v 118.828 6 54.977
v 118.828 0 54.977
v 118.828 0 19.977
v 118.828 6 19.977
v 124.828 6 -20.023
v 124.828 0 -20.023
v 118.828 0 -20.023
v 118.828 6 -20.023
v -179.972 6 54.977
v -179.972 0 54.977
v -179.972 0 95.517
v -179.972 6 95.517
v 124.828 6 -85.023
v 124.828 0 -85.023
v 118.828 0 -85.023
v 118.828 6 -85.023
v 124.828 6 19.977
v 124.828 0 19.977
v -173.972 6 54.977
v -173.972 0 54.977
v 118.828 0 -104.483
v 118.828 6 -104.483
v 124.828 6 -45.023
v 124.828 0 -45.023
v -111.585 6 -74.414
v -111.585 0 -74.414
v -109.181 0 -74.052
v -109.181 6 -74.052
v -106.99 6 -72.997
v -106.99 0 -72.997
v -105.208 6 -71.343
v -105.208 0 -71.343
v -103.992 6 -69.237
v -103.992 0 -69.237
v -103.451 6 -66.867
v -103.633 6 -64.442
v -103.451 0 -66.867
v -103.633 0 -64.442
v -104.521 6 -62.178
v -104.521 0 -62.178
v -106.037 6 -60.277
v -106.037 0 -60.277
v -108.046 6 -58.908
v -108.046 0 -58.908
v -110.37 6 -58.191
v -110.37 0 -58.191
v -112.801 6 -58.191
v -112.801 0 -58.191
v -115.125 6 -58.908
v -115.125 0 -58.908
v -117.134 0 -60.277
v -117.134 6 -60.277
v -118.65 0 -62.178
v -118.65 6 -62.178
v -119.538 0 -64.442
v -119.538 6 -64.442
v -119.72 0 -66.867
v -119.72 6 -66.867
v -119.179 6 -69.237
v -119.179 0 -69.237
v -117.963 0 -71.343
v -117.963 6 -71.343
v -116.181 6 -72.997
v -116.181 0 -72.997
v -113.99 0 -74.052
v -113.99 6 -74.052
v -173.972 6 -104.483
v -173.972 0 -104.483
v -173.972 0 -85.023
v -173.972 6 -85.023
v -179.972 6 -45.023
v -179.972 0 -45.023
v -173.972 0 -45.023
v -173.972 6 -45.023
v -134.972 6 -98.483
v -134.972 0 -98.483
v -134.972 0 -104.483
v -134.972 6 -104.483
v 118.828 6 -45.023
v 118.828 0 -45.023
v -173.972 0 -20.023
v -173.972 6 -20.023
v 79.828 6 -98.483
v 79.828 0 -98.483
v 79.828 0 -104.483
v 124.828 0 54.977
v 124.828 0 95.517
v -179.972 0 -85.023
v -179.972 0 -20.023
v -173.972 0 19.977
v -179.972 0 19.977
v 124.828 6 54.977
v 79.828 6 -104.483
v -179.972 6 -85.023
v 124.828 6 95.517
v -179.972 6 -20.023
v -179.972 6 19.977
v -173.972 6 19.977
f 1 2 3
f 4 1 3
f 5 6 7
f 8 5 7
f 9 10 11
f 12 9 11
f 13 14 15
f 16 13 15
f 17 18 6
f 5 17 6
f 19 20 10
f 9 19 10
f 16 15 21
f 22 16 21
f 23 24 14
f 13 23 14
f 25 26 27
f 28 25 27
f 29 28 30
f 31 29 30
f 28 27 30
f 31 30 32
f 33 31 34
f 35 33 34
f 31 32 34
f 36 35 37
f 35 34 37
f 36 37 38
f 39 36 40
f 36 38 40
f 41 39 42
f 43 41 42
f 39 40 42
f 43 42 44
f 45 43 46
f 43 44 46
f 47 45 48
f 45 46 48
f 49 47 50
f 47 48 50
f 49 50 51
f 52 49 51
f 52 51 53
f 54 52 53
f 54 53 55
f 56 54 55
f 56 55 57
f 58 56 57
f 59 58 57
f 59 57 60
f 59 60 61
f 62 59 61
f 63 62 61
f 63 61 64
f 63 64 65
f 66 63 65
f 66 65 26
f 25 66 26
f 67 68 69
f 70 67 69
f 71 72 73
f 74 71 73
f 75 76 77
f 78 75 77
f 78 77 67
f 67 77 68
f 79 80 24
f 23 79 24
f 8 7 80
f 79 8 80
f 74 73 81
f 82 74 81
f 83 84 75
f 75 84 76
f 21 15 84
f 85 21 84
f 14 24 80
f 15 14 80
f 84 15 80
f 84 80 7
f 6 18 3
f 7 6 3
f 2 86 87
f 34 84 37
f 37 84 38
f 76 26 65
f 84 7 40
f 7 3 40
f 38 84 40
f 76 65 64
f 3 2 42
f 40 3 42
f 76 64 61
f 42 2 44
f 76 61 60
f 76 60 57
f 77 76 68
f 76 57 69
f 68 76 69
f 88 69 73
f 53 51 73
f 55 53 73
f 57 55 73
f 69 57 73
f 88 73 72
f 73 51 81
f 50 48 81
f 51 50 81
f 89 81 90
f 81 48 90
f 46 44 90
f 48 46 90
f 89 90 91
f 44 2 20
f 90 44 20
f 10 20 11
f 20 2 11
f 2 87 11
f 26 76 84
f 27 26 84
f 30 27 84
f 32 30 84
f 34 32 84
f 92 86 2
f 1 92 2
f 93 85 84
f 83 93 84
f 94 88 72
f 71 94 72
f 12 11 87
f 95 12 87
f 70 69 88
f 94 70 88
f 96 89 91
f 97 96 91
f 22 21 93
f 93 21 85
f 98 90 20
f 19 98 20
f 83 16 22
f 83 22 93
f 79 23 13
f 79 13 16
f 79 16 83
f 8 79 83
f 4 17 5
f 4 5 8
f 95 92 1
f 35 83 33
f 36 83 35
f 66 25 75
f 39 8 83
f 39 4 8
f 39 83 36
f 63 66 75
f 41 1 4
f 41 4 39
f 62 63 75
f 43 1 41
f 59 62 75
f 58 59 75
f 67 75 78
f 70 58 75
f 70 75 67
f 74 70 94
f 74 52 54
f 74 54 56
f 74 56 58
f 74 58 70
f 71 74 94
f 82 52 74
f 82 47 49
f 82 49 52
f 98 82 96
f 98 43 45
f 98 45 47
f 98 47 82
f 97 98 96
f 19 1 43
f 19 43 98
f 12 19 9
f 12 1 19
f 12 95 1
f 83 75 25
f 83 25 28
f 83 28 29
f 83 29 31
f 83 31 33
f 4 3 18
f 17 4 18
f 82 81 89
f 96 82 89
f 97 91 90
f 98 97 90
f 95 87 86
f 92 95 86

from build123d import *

# Parameters (mm, degrees)
BOSS_EXTRUDE1_DEPTH = 6
SKETCH2_R           = 8.15711865
CUT_EXTRUDE1_DEPTH  = 10


with BuildPart() as part:
    # Sketch1 → Boss-Extrude1 (new body)
    with BuildSketch(Plane(origin=(0, 0, 0), x_dir=(-1, 0, 0), z_dir=(0, 1, 0))):
        Polygon((-79.827586207, -104.482758621), (-79.827586207, -98.482758621), (134.972413793, -98.482758621), (134.972413793, -104.482758621), (173.972413793, -104.482758621), (173.972413793, -85.022758621), (179.972413793, -85.022758621), (179.972413793, -45.022758621), (173.972413793, -45.022758621), (173.972413793, -20.022758621), (179.972413793, -20.022758621), (179.972413793, 19.977241379), (173.972413793, 19.977241379), (173.972413793, 54.977241379), (179.972413793, 54.977241379), (179.972413793, 95.517241379), (-124.827586207, 95.517241379), (-124.827586207, 54.977241379), (-118.827586207, 54.977241379), (-118.827586207, 19.977241379), (-124.827586207, 19.977241379), (-124.827586207, -20.022758621), (-118.827586207, -20.022758621), (-118.827586207, -45.022758621), (-124.827586207, -45.022758621), (-124.827586207, -85.022758621), (-118.827586207, -85.022758621), (-118.827586207, -104.482758621), align=None)
    extrude(amount=BOSS_EXTRUDE1_DEPTH)

    # Sketch2 → Cut-Extrude1 (cut)
    with BuildSketch(Plane.XZ):
        with Locations(Location((-111.585458186, -66.257055968, 0), (0, 0, 270))):
            Circle(SKETCH2_R)
    extrude(amount=-CUT_EXTRUDE1_DEPTH, mode=Mode.SUBTRACT)


solid = part.part
